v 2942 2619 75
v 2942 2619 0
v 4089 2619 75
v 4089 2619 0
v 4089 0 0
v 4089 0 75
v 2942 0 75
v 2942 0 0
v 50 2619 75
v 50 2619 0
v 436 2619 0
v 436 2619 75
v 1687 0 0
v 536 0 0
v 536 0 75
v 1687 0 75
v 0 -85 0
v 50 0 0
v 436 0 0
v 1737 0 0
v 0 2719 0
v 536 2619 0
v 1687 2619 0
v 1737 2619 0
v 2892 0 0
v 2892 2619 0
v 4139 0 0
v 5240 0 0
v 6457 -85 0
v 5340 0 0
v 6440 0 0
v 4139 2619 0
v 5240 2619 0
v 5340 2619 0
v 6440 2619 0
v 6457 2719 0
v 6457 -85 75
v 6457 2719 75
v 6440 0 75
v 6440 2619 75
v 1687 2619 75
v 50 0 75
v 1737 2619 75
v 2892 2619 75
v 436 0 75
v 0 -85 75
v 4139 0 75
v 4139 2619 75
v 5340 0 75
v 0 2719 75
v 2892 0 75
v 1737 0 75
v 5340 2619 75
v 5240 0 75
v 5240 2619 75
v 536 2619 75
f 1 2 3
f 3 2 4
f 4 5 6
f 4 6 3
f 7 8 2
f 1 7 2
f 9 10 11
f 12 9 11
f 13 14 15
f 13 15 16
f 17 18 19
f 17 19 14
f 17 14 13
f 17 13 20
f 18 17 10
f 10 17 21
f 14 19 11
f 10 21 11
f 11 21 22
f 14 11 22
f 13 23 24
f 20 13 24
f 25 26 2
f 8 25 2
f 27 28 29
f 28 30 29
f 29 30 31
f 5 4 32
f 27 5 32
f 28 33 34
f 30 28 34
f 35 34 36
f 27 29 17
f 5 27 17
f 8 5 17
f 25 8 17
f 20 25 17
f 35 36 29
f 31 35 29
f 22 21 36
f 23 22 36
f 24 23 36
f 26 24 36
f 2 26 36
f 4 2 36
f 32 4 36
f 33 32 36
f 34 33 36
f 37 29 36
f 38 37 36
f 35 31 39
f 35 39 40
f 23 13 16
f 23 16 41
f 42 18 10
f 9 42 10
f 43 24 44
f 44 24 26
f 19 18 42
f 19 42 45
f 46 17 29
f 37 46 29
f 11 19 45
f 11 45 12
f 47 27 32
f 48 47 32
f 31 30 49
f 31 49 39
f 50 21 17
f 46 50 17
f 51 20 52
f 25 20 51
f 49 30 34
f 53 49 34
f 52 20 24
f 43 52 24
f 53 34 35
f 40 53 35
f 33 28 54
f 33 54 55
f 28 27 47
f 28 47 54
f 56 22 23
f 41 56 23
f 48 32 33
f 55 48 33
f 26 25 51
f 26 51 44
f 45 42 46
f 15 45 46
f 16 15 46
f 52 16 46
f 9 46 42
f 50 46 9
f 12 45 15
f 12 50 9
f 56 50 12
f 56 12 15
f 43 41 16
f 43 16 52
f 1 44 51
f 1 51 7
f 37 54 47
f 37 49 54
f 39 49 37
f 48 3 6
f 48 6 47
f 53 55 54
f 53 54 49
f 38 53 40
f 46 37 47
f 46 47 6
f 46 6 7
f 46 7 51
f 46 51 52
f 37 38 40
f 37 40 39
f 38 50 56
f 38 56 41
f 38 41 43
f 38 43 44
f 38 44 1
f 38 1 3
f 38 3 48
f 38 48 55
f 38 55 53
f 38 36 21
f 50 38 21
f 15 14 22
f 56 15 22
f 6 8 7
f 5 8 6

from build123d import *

# Parameters (mm, degrees)
F0_W     = 386
F0_H     = 2619
F0_W_2   = 1151
F0_W_3   = 1155
F0_W_4   = 1147
F0_W_5   = 1101
F0_W_6   = 1100
F1_DEPTH = 75


with BuildPart() as f1:
    # F0 (on Top) → F1 (new body)
    with BuildSketch(Plane.XY):
        Polygon((0, 2719), (0, 0), (0, -85), (6457, -85), (6457, 0), (6457, 2619), (6457, 2719), (50, 2719), align=None)
        with Locations((243, 1309.5)):
            Rectangle(F0_W, F0_H, mode=Mode.SUBTRACT)
        with Locations((1111.5, 1309.5)):
            Rectangle(F0_W_2, F0_H, mode=Mode.SUBTRACT)
        with Locations((2314.5, 1309.5)):
            Rectangle(F0_W_3, F0_H, mode=Mode.SUBTRACT)
        with Locations((3515.5, 1309.5)):
            Rectangle(F0_W_4, F0_H, mode=Mode.SUBTRACT)
        with Locations((4689.5, 1309.5)):
            Rectangle(F0_W_5, F0_H, mode=Mode.SUBTRACT)
        with Locations((5890, 1309.5)):
            Rectangle(F0_W_6, F0_H, mode=Mode.SUBTRACT)
    extrude(amount=F1_DEPTH)


solid = f1.part
